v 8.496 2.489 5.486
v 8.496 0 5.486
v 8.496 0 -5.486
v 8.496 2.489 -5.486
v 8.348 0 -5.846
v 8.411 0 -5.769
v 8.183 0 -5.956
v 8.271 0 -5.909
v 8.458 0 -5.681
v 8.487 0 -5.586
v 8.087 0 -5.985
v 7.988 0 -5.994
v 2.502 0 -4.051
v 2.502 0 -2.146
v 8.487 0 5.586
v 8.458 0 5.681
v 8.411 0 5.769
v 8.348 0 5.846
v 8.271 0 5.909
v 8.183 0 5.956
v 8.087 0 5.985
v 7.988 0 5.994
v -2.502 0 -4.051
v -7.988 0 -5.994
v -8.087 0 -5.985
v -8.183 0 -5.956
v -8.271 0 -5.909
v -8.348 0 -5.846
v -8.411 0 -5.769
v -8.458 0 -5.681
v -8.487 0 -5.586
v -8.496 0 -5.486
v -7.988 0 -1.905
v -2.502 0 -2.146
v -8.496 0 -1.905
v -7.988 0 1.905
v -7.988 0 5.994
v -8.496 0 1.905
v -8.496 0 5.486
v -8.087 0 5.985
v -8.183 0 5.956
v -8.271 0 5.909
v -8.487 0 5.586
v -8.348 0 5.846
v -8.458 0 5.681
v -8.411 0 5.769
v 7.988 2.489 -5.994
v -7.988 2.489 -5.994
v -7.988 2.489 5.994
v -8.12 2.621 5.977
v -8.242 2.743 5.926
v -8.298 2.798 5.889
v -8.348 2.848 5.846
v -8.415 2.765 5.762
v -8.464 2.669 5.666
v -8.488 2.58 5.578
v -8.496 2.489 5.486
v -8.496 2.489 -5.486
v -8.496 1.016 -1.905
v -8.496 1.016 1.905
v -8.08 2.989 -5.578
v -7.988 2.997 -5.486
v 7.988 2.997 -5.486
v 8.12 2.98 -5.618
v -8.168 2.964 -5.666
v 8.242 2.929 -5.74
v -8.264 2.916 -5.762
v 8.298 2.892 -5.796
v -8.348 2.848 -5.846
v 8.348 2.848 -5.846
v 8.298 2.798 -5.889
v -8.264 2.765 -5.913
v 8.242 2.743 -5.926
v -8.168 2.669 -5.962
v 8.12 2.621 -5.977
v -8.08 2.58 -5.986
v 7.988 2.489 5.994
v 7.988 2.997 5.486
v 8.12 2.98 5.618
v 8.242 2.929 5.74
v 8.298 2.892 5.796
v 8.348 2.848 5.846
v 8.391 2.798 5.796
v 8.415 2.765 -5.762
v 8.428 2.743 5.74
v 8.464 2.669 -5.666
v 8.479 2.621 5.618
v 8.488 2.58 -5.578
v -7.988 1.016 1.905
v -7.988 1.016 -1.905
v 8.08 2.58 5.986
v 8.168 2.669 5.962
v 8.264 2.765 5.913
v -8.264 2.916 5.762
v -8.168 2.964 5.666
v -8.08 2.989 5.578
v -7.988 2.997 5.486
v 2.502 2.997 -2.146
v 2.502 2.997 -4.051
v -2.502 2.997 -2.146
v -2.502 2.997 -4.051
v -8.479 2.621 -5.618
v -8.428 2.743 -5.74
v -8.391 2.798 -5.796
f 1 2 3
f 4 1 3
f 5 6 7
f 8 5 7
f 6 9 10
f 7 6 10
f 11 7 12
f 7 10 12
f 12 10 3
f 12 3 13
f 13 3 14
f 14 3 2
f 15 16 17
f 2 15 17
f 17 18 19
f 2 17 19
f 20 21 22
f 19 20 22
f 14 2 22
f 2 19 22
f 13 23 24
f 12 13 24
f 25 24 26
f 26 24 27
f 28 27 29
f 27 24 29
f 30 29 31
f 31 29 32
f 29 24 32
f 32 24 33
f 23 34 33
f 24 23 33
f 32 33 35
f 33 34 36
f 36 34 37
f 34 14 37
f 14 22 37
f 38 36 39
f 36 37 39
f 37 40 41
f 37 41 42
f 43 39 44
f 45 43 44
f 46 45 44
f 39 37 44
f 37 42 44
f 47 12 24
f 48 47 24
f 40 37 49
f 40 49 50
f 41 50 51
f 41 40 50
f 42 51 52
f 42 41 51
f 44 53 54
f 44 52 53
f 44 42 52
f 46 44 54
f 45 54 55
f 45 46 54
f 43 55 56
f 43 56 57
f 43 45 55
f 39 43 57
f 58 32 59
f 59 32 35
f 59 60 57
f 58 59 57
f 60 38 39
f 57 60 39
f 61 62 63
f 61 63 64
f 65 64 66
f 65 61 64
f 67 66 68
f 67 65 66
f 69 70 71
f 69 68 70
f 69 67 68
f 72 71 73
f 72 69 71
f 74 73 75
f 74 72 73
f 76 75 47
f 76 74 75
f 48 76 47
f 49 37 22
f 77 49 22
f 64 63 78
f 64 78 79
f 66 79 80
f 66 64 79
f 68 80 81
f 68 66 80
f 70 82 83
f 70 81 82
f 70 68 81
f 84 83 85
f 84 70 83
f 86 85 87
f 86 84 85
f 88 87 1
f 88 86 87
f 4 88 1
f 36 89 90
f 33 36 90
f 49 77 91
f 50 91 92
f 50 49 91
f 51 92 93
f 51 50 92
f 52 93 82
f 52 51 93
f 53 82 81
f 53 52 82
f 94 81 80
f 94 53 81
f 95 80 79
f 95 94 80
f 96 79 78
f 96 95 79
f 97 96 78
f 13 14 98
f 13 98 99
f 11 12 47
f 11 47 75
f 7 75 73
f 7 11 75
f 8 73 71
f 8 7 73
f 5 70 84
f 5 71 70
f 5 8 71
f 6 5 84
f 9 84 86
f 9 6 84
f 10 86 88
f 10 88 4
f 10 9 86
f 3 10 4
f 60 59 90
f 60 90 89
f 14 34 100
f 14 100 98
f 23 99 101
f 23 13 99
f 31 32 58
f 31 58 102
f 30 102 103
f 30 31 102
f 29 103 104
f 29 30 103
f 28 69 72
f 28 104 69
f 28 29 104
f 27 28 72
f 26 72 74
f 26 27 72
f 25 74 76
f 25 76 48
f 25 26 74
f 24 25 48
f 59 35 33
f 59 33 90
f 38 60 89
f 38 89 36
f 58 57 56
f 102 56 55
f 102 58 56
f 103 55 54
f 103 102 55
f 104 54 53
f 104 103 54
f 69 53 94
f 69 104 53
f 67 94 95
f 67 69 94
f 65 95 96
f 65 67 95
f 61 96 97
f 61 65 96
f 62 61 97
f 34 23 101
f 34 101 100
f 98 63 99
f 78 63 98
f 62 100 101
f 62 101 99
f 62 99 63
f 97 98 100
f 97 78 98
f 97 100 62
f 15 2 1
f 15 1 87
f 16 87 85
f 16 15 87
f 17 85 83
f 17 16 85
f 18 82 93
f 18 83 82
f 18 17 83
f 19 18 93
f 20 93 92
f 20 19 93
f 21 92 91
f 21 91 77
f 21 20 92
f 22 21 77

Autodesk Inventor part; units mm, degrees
sketch "Sketch_1" plane through (0, 0, 0) normal (0, 1, 0) x (-1, 0, 0)
  line L0 (8.4963, -5.4864) -> (8.4963, 5.4864)
  arc A0 (8.4963, 5.4864) -> (7.9883, 5.9944) centre (7.9883, 5.4864) ccw
  line L1 (7.9883, 5.9944) -> (-7.9883, 5.9944)
  arc A1 (-7.9883, 5.9944) -> (-8.4963, 5.4864) centre (-7.9883, 5.4864) ccw
  line L2 (-8.4963, 5.4864) -> (-8.4963, -5.4864)
  arc A2 (-8.4963, -5.4864) -> (-7.9883, -5.9944) centre (-7.9883, -5.4864) ccw
  line L3 (-7.9883, -5.9944) -> (7.9883, -5.9944)
  arc A3 (7.9883, -5.9944) -> (8.4963, -5.4864) centre (7.9883, -5.4864) ccw
extrude "Extrusion1" add sketch "Sketch_1" along normal blind 2.9972
sketch "Sketch_6" plane through (0, 0, 0) normal (0, 0, 1) x (1, 0, 0)
  line L0 (-10.16, 5.08) -> (-10.16, -2.54)
  line L1 (-10.16, -2.54) -> (10.16, -2.54)
  line L2 (10.16, -2.54) -> (10.16, 5.08)
  line L3 (10.16, 5.08) -> (-10.16, 5.08)
  line L4 (-8.4963, 0) -> (8.4963, 0)
  line L5 (8.4963, 0) -> (8.4963, 2.4892)
  arc A0 (8.4963, 2.4892) -> (7.9883, 2.9972) centre (7.9883, 2.4892) ccw
  line L6 (7.9883, 2.9972) -> (-7.9883, 2.9972)
  arc A1 (-7.9883, 2.9972) -> (-8.4963, 2.4892) centre (-7.9883, 2.4892) ccw
  line L7 (-8.4963, 2.4892) -> (-8.4963, 0)
extrude "Extrusion2" cut sketch "Sketch_6" along normal mid plane 15.24
sketch "Sketch_9" plane through (0, 0, 0) normal (1, 0, 0) x (0, 1, 0)
  line L0 (5.08, 10.16) -> (-2.54, 10.16)
  line L1 (-2.54, 10.16) -> (-2.54, -10.16)
  line L2 (-2.54, -10.16) -> (5.08, -10.16)
  line L3 (5.08, -10.16) -> (5.08, 10.16)
  line L4 (0, 5.9944) -> (0, -5.9944)
  line L5 (0, -5.9944) -> (2.4892, -5.9944)
  arc A0 (2.4892, -5.9944) -> (2.9972, -5.4864) centre (2.4892, -5.4864) ccw
  line L6 (2.9972, -5.4864) -> (2.9972, 5.4864)
  arc A1 (2.9972, 5.4864) -> (2.4892, 5.9944) centre (2.4892, 5.4864) ccw
  line L7 (2.4892, 5.9944) -> (0, 5.9944)
extrude "Extrusion3" cut sketch "Sketch_9" along normal mid plane 20.32
sketch "Sketch_4" plane through (-8.4963, 0, 0) normal (1, 0, 0) x (0, 0, -1)
  line L0 (-1.905, 0) -> (1.905, 0)
  line L1 (1.905, 0) -> (1.905, 1.016)
  line L2 (1.905, 1.016) -> (-1.905, 1.016)
  line L3 (-1.905, 1.016) -> (-1.905, 0)
extrude "Extrusion4" cut sketch "Sketch_4" along normal blind 0.508
sketch "Sketch_5" plane through (0, 0, 0) normal (0, 1, 0) x (-1, 0, 0)
  line L0 (2.5019, -4.0513) -> (2.5019, -2.1463)
  line L1 (2.5019, -2.1463) -> (-2.5019, -2.1463)
  line L2 (-2.5019, -2.1463) -> (-2.5019, -4.0513)
  line L3 (-2.5019, -4.0513) -> (2.5019, -4.0513)
extrude "Extrusion5" cut sketch "Sketch_5" along normal blind 5.08
ref_plane "P_XY" through (0, 0, 0) normal (0, 1, 0) x (1, 0, 0)
ref_plane "P_YZ" through (0, 0, 0) normal (1, 0, 0) x (0, 0, -1)
ref_plane "P_ZX" through (0, 0, 0) normal (0, 0, -1) x (0, 1, 0)
ref_plane "SPOT_XY" through (0, 0, -3.0988) normal (0, -1, 0) x (1, 0, 0)
ref_plane "SPOT_YZ" through (0, 0, -3.0988) normal (1, 0, 0) x (0, 0, 1)
ref_plane "SPOT_ZX" through (0, 0, -3.0988) normal (0, 0, 1) x (0, -1, 0)
properties part number "UB16NKG015F-NR"
